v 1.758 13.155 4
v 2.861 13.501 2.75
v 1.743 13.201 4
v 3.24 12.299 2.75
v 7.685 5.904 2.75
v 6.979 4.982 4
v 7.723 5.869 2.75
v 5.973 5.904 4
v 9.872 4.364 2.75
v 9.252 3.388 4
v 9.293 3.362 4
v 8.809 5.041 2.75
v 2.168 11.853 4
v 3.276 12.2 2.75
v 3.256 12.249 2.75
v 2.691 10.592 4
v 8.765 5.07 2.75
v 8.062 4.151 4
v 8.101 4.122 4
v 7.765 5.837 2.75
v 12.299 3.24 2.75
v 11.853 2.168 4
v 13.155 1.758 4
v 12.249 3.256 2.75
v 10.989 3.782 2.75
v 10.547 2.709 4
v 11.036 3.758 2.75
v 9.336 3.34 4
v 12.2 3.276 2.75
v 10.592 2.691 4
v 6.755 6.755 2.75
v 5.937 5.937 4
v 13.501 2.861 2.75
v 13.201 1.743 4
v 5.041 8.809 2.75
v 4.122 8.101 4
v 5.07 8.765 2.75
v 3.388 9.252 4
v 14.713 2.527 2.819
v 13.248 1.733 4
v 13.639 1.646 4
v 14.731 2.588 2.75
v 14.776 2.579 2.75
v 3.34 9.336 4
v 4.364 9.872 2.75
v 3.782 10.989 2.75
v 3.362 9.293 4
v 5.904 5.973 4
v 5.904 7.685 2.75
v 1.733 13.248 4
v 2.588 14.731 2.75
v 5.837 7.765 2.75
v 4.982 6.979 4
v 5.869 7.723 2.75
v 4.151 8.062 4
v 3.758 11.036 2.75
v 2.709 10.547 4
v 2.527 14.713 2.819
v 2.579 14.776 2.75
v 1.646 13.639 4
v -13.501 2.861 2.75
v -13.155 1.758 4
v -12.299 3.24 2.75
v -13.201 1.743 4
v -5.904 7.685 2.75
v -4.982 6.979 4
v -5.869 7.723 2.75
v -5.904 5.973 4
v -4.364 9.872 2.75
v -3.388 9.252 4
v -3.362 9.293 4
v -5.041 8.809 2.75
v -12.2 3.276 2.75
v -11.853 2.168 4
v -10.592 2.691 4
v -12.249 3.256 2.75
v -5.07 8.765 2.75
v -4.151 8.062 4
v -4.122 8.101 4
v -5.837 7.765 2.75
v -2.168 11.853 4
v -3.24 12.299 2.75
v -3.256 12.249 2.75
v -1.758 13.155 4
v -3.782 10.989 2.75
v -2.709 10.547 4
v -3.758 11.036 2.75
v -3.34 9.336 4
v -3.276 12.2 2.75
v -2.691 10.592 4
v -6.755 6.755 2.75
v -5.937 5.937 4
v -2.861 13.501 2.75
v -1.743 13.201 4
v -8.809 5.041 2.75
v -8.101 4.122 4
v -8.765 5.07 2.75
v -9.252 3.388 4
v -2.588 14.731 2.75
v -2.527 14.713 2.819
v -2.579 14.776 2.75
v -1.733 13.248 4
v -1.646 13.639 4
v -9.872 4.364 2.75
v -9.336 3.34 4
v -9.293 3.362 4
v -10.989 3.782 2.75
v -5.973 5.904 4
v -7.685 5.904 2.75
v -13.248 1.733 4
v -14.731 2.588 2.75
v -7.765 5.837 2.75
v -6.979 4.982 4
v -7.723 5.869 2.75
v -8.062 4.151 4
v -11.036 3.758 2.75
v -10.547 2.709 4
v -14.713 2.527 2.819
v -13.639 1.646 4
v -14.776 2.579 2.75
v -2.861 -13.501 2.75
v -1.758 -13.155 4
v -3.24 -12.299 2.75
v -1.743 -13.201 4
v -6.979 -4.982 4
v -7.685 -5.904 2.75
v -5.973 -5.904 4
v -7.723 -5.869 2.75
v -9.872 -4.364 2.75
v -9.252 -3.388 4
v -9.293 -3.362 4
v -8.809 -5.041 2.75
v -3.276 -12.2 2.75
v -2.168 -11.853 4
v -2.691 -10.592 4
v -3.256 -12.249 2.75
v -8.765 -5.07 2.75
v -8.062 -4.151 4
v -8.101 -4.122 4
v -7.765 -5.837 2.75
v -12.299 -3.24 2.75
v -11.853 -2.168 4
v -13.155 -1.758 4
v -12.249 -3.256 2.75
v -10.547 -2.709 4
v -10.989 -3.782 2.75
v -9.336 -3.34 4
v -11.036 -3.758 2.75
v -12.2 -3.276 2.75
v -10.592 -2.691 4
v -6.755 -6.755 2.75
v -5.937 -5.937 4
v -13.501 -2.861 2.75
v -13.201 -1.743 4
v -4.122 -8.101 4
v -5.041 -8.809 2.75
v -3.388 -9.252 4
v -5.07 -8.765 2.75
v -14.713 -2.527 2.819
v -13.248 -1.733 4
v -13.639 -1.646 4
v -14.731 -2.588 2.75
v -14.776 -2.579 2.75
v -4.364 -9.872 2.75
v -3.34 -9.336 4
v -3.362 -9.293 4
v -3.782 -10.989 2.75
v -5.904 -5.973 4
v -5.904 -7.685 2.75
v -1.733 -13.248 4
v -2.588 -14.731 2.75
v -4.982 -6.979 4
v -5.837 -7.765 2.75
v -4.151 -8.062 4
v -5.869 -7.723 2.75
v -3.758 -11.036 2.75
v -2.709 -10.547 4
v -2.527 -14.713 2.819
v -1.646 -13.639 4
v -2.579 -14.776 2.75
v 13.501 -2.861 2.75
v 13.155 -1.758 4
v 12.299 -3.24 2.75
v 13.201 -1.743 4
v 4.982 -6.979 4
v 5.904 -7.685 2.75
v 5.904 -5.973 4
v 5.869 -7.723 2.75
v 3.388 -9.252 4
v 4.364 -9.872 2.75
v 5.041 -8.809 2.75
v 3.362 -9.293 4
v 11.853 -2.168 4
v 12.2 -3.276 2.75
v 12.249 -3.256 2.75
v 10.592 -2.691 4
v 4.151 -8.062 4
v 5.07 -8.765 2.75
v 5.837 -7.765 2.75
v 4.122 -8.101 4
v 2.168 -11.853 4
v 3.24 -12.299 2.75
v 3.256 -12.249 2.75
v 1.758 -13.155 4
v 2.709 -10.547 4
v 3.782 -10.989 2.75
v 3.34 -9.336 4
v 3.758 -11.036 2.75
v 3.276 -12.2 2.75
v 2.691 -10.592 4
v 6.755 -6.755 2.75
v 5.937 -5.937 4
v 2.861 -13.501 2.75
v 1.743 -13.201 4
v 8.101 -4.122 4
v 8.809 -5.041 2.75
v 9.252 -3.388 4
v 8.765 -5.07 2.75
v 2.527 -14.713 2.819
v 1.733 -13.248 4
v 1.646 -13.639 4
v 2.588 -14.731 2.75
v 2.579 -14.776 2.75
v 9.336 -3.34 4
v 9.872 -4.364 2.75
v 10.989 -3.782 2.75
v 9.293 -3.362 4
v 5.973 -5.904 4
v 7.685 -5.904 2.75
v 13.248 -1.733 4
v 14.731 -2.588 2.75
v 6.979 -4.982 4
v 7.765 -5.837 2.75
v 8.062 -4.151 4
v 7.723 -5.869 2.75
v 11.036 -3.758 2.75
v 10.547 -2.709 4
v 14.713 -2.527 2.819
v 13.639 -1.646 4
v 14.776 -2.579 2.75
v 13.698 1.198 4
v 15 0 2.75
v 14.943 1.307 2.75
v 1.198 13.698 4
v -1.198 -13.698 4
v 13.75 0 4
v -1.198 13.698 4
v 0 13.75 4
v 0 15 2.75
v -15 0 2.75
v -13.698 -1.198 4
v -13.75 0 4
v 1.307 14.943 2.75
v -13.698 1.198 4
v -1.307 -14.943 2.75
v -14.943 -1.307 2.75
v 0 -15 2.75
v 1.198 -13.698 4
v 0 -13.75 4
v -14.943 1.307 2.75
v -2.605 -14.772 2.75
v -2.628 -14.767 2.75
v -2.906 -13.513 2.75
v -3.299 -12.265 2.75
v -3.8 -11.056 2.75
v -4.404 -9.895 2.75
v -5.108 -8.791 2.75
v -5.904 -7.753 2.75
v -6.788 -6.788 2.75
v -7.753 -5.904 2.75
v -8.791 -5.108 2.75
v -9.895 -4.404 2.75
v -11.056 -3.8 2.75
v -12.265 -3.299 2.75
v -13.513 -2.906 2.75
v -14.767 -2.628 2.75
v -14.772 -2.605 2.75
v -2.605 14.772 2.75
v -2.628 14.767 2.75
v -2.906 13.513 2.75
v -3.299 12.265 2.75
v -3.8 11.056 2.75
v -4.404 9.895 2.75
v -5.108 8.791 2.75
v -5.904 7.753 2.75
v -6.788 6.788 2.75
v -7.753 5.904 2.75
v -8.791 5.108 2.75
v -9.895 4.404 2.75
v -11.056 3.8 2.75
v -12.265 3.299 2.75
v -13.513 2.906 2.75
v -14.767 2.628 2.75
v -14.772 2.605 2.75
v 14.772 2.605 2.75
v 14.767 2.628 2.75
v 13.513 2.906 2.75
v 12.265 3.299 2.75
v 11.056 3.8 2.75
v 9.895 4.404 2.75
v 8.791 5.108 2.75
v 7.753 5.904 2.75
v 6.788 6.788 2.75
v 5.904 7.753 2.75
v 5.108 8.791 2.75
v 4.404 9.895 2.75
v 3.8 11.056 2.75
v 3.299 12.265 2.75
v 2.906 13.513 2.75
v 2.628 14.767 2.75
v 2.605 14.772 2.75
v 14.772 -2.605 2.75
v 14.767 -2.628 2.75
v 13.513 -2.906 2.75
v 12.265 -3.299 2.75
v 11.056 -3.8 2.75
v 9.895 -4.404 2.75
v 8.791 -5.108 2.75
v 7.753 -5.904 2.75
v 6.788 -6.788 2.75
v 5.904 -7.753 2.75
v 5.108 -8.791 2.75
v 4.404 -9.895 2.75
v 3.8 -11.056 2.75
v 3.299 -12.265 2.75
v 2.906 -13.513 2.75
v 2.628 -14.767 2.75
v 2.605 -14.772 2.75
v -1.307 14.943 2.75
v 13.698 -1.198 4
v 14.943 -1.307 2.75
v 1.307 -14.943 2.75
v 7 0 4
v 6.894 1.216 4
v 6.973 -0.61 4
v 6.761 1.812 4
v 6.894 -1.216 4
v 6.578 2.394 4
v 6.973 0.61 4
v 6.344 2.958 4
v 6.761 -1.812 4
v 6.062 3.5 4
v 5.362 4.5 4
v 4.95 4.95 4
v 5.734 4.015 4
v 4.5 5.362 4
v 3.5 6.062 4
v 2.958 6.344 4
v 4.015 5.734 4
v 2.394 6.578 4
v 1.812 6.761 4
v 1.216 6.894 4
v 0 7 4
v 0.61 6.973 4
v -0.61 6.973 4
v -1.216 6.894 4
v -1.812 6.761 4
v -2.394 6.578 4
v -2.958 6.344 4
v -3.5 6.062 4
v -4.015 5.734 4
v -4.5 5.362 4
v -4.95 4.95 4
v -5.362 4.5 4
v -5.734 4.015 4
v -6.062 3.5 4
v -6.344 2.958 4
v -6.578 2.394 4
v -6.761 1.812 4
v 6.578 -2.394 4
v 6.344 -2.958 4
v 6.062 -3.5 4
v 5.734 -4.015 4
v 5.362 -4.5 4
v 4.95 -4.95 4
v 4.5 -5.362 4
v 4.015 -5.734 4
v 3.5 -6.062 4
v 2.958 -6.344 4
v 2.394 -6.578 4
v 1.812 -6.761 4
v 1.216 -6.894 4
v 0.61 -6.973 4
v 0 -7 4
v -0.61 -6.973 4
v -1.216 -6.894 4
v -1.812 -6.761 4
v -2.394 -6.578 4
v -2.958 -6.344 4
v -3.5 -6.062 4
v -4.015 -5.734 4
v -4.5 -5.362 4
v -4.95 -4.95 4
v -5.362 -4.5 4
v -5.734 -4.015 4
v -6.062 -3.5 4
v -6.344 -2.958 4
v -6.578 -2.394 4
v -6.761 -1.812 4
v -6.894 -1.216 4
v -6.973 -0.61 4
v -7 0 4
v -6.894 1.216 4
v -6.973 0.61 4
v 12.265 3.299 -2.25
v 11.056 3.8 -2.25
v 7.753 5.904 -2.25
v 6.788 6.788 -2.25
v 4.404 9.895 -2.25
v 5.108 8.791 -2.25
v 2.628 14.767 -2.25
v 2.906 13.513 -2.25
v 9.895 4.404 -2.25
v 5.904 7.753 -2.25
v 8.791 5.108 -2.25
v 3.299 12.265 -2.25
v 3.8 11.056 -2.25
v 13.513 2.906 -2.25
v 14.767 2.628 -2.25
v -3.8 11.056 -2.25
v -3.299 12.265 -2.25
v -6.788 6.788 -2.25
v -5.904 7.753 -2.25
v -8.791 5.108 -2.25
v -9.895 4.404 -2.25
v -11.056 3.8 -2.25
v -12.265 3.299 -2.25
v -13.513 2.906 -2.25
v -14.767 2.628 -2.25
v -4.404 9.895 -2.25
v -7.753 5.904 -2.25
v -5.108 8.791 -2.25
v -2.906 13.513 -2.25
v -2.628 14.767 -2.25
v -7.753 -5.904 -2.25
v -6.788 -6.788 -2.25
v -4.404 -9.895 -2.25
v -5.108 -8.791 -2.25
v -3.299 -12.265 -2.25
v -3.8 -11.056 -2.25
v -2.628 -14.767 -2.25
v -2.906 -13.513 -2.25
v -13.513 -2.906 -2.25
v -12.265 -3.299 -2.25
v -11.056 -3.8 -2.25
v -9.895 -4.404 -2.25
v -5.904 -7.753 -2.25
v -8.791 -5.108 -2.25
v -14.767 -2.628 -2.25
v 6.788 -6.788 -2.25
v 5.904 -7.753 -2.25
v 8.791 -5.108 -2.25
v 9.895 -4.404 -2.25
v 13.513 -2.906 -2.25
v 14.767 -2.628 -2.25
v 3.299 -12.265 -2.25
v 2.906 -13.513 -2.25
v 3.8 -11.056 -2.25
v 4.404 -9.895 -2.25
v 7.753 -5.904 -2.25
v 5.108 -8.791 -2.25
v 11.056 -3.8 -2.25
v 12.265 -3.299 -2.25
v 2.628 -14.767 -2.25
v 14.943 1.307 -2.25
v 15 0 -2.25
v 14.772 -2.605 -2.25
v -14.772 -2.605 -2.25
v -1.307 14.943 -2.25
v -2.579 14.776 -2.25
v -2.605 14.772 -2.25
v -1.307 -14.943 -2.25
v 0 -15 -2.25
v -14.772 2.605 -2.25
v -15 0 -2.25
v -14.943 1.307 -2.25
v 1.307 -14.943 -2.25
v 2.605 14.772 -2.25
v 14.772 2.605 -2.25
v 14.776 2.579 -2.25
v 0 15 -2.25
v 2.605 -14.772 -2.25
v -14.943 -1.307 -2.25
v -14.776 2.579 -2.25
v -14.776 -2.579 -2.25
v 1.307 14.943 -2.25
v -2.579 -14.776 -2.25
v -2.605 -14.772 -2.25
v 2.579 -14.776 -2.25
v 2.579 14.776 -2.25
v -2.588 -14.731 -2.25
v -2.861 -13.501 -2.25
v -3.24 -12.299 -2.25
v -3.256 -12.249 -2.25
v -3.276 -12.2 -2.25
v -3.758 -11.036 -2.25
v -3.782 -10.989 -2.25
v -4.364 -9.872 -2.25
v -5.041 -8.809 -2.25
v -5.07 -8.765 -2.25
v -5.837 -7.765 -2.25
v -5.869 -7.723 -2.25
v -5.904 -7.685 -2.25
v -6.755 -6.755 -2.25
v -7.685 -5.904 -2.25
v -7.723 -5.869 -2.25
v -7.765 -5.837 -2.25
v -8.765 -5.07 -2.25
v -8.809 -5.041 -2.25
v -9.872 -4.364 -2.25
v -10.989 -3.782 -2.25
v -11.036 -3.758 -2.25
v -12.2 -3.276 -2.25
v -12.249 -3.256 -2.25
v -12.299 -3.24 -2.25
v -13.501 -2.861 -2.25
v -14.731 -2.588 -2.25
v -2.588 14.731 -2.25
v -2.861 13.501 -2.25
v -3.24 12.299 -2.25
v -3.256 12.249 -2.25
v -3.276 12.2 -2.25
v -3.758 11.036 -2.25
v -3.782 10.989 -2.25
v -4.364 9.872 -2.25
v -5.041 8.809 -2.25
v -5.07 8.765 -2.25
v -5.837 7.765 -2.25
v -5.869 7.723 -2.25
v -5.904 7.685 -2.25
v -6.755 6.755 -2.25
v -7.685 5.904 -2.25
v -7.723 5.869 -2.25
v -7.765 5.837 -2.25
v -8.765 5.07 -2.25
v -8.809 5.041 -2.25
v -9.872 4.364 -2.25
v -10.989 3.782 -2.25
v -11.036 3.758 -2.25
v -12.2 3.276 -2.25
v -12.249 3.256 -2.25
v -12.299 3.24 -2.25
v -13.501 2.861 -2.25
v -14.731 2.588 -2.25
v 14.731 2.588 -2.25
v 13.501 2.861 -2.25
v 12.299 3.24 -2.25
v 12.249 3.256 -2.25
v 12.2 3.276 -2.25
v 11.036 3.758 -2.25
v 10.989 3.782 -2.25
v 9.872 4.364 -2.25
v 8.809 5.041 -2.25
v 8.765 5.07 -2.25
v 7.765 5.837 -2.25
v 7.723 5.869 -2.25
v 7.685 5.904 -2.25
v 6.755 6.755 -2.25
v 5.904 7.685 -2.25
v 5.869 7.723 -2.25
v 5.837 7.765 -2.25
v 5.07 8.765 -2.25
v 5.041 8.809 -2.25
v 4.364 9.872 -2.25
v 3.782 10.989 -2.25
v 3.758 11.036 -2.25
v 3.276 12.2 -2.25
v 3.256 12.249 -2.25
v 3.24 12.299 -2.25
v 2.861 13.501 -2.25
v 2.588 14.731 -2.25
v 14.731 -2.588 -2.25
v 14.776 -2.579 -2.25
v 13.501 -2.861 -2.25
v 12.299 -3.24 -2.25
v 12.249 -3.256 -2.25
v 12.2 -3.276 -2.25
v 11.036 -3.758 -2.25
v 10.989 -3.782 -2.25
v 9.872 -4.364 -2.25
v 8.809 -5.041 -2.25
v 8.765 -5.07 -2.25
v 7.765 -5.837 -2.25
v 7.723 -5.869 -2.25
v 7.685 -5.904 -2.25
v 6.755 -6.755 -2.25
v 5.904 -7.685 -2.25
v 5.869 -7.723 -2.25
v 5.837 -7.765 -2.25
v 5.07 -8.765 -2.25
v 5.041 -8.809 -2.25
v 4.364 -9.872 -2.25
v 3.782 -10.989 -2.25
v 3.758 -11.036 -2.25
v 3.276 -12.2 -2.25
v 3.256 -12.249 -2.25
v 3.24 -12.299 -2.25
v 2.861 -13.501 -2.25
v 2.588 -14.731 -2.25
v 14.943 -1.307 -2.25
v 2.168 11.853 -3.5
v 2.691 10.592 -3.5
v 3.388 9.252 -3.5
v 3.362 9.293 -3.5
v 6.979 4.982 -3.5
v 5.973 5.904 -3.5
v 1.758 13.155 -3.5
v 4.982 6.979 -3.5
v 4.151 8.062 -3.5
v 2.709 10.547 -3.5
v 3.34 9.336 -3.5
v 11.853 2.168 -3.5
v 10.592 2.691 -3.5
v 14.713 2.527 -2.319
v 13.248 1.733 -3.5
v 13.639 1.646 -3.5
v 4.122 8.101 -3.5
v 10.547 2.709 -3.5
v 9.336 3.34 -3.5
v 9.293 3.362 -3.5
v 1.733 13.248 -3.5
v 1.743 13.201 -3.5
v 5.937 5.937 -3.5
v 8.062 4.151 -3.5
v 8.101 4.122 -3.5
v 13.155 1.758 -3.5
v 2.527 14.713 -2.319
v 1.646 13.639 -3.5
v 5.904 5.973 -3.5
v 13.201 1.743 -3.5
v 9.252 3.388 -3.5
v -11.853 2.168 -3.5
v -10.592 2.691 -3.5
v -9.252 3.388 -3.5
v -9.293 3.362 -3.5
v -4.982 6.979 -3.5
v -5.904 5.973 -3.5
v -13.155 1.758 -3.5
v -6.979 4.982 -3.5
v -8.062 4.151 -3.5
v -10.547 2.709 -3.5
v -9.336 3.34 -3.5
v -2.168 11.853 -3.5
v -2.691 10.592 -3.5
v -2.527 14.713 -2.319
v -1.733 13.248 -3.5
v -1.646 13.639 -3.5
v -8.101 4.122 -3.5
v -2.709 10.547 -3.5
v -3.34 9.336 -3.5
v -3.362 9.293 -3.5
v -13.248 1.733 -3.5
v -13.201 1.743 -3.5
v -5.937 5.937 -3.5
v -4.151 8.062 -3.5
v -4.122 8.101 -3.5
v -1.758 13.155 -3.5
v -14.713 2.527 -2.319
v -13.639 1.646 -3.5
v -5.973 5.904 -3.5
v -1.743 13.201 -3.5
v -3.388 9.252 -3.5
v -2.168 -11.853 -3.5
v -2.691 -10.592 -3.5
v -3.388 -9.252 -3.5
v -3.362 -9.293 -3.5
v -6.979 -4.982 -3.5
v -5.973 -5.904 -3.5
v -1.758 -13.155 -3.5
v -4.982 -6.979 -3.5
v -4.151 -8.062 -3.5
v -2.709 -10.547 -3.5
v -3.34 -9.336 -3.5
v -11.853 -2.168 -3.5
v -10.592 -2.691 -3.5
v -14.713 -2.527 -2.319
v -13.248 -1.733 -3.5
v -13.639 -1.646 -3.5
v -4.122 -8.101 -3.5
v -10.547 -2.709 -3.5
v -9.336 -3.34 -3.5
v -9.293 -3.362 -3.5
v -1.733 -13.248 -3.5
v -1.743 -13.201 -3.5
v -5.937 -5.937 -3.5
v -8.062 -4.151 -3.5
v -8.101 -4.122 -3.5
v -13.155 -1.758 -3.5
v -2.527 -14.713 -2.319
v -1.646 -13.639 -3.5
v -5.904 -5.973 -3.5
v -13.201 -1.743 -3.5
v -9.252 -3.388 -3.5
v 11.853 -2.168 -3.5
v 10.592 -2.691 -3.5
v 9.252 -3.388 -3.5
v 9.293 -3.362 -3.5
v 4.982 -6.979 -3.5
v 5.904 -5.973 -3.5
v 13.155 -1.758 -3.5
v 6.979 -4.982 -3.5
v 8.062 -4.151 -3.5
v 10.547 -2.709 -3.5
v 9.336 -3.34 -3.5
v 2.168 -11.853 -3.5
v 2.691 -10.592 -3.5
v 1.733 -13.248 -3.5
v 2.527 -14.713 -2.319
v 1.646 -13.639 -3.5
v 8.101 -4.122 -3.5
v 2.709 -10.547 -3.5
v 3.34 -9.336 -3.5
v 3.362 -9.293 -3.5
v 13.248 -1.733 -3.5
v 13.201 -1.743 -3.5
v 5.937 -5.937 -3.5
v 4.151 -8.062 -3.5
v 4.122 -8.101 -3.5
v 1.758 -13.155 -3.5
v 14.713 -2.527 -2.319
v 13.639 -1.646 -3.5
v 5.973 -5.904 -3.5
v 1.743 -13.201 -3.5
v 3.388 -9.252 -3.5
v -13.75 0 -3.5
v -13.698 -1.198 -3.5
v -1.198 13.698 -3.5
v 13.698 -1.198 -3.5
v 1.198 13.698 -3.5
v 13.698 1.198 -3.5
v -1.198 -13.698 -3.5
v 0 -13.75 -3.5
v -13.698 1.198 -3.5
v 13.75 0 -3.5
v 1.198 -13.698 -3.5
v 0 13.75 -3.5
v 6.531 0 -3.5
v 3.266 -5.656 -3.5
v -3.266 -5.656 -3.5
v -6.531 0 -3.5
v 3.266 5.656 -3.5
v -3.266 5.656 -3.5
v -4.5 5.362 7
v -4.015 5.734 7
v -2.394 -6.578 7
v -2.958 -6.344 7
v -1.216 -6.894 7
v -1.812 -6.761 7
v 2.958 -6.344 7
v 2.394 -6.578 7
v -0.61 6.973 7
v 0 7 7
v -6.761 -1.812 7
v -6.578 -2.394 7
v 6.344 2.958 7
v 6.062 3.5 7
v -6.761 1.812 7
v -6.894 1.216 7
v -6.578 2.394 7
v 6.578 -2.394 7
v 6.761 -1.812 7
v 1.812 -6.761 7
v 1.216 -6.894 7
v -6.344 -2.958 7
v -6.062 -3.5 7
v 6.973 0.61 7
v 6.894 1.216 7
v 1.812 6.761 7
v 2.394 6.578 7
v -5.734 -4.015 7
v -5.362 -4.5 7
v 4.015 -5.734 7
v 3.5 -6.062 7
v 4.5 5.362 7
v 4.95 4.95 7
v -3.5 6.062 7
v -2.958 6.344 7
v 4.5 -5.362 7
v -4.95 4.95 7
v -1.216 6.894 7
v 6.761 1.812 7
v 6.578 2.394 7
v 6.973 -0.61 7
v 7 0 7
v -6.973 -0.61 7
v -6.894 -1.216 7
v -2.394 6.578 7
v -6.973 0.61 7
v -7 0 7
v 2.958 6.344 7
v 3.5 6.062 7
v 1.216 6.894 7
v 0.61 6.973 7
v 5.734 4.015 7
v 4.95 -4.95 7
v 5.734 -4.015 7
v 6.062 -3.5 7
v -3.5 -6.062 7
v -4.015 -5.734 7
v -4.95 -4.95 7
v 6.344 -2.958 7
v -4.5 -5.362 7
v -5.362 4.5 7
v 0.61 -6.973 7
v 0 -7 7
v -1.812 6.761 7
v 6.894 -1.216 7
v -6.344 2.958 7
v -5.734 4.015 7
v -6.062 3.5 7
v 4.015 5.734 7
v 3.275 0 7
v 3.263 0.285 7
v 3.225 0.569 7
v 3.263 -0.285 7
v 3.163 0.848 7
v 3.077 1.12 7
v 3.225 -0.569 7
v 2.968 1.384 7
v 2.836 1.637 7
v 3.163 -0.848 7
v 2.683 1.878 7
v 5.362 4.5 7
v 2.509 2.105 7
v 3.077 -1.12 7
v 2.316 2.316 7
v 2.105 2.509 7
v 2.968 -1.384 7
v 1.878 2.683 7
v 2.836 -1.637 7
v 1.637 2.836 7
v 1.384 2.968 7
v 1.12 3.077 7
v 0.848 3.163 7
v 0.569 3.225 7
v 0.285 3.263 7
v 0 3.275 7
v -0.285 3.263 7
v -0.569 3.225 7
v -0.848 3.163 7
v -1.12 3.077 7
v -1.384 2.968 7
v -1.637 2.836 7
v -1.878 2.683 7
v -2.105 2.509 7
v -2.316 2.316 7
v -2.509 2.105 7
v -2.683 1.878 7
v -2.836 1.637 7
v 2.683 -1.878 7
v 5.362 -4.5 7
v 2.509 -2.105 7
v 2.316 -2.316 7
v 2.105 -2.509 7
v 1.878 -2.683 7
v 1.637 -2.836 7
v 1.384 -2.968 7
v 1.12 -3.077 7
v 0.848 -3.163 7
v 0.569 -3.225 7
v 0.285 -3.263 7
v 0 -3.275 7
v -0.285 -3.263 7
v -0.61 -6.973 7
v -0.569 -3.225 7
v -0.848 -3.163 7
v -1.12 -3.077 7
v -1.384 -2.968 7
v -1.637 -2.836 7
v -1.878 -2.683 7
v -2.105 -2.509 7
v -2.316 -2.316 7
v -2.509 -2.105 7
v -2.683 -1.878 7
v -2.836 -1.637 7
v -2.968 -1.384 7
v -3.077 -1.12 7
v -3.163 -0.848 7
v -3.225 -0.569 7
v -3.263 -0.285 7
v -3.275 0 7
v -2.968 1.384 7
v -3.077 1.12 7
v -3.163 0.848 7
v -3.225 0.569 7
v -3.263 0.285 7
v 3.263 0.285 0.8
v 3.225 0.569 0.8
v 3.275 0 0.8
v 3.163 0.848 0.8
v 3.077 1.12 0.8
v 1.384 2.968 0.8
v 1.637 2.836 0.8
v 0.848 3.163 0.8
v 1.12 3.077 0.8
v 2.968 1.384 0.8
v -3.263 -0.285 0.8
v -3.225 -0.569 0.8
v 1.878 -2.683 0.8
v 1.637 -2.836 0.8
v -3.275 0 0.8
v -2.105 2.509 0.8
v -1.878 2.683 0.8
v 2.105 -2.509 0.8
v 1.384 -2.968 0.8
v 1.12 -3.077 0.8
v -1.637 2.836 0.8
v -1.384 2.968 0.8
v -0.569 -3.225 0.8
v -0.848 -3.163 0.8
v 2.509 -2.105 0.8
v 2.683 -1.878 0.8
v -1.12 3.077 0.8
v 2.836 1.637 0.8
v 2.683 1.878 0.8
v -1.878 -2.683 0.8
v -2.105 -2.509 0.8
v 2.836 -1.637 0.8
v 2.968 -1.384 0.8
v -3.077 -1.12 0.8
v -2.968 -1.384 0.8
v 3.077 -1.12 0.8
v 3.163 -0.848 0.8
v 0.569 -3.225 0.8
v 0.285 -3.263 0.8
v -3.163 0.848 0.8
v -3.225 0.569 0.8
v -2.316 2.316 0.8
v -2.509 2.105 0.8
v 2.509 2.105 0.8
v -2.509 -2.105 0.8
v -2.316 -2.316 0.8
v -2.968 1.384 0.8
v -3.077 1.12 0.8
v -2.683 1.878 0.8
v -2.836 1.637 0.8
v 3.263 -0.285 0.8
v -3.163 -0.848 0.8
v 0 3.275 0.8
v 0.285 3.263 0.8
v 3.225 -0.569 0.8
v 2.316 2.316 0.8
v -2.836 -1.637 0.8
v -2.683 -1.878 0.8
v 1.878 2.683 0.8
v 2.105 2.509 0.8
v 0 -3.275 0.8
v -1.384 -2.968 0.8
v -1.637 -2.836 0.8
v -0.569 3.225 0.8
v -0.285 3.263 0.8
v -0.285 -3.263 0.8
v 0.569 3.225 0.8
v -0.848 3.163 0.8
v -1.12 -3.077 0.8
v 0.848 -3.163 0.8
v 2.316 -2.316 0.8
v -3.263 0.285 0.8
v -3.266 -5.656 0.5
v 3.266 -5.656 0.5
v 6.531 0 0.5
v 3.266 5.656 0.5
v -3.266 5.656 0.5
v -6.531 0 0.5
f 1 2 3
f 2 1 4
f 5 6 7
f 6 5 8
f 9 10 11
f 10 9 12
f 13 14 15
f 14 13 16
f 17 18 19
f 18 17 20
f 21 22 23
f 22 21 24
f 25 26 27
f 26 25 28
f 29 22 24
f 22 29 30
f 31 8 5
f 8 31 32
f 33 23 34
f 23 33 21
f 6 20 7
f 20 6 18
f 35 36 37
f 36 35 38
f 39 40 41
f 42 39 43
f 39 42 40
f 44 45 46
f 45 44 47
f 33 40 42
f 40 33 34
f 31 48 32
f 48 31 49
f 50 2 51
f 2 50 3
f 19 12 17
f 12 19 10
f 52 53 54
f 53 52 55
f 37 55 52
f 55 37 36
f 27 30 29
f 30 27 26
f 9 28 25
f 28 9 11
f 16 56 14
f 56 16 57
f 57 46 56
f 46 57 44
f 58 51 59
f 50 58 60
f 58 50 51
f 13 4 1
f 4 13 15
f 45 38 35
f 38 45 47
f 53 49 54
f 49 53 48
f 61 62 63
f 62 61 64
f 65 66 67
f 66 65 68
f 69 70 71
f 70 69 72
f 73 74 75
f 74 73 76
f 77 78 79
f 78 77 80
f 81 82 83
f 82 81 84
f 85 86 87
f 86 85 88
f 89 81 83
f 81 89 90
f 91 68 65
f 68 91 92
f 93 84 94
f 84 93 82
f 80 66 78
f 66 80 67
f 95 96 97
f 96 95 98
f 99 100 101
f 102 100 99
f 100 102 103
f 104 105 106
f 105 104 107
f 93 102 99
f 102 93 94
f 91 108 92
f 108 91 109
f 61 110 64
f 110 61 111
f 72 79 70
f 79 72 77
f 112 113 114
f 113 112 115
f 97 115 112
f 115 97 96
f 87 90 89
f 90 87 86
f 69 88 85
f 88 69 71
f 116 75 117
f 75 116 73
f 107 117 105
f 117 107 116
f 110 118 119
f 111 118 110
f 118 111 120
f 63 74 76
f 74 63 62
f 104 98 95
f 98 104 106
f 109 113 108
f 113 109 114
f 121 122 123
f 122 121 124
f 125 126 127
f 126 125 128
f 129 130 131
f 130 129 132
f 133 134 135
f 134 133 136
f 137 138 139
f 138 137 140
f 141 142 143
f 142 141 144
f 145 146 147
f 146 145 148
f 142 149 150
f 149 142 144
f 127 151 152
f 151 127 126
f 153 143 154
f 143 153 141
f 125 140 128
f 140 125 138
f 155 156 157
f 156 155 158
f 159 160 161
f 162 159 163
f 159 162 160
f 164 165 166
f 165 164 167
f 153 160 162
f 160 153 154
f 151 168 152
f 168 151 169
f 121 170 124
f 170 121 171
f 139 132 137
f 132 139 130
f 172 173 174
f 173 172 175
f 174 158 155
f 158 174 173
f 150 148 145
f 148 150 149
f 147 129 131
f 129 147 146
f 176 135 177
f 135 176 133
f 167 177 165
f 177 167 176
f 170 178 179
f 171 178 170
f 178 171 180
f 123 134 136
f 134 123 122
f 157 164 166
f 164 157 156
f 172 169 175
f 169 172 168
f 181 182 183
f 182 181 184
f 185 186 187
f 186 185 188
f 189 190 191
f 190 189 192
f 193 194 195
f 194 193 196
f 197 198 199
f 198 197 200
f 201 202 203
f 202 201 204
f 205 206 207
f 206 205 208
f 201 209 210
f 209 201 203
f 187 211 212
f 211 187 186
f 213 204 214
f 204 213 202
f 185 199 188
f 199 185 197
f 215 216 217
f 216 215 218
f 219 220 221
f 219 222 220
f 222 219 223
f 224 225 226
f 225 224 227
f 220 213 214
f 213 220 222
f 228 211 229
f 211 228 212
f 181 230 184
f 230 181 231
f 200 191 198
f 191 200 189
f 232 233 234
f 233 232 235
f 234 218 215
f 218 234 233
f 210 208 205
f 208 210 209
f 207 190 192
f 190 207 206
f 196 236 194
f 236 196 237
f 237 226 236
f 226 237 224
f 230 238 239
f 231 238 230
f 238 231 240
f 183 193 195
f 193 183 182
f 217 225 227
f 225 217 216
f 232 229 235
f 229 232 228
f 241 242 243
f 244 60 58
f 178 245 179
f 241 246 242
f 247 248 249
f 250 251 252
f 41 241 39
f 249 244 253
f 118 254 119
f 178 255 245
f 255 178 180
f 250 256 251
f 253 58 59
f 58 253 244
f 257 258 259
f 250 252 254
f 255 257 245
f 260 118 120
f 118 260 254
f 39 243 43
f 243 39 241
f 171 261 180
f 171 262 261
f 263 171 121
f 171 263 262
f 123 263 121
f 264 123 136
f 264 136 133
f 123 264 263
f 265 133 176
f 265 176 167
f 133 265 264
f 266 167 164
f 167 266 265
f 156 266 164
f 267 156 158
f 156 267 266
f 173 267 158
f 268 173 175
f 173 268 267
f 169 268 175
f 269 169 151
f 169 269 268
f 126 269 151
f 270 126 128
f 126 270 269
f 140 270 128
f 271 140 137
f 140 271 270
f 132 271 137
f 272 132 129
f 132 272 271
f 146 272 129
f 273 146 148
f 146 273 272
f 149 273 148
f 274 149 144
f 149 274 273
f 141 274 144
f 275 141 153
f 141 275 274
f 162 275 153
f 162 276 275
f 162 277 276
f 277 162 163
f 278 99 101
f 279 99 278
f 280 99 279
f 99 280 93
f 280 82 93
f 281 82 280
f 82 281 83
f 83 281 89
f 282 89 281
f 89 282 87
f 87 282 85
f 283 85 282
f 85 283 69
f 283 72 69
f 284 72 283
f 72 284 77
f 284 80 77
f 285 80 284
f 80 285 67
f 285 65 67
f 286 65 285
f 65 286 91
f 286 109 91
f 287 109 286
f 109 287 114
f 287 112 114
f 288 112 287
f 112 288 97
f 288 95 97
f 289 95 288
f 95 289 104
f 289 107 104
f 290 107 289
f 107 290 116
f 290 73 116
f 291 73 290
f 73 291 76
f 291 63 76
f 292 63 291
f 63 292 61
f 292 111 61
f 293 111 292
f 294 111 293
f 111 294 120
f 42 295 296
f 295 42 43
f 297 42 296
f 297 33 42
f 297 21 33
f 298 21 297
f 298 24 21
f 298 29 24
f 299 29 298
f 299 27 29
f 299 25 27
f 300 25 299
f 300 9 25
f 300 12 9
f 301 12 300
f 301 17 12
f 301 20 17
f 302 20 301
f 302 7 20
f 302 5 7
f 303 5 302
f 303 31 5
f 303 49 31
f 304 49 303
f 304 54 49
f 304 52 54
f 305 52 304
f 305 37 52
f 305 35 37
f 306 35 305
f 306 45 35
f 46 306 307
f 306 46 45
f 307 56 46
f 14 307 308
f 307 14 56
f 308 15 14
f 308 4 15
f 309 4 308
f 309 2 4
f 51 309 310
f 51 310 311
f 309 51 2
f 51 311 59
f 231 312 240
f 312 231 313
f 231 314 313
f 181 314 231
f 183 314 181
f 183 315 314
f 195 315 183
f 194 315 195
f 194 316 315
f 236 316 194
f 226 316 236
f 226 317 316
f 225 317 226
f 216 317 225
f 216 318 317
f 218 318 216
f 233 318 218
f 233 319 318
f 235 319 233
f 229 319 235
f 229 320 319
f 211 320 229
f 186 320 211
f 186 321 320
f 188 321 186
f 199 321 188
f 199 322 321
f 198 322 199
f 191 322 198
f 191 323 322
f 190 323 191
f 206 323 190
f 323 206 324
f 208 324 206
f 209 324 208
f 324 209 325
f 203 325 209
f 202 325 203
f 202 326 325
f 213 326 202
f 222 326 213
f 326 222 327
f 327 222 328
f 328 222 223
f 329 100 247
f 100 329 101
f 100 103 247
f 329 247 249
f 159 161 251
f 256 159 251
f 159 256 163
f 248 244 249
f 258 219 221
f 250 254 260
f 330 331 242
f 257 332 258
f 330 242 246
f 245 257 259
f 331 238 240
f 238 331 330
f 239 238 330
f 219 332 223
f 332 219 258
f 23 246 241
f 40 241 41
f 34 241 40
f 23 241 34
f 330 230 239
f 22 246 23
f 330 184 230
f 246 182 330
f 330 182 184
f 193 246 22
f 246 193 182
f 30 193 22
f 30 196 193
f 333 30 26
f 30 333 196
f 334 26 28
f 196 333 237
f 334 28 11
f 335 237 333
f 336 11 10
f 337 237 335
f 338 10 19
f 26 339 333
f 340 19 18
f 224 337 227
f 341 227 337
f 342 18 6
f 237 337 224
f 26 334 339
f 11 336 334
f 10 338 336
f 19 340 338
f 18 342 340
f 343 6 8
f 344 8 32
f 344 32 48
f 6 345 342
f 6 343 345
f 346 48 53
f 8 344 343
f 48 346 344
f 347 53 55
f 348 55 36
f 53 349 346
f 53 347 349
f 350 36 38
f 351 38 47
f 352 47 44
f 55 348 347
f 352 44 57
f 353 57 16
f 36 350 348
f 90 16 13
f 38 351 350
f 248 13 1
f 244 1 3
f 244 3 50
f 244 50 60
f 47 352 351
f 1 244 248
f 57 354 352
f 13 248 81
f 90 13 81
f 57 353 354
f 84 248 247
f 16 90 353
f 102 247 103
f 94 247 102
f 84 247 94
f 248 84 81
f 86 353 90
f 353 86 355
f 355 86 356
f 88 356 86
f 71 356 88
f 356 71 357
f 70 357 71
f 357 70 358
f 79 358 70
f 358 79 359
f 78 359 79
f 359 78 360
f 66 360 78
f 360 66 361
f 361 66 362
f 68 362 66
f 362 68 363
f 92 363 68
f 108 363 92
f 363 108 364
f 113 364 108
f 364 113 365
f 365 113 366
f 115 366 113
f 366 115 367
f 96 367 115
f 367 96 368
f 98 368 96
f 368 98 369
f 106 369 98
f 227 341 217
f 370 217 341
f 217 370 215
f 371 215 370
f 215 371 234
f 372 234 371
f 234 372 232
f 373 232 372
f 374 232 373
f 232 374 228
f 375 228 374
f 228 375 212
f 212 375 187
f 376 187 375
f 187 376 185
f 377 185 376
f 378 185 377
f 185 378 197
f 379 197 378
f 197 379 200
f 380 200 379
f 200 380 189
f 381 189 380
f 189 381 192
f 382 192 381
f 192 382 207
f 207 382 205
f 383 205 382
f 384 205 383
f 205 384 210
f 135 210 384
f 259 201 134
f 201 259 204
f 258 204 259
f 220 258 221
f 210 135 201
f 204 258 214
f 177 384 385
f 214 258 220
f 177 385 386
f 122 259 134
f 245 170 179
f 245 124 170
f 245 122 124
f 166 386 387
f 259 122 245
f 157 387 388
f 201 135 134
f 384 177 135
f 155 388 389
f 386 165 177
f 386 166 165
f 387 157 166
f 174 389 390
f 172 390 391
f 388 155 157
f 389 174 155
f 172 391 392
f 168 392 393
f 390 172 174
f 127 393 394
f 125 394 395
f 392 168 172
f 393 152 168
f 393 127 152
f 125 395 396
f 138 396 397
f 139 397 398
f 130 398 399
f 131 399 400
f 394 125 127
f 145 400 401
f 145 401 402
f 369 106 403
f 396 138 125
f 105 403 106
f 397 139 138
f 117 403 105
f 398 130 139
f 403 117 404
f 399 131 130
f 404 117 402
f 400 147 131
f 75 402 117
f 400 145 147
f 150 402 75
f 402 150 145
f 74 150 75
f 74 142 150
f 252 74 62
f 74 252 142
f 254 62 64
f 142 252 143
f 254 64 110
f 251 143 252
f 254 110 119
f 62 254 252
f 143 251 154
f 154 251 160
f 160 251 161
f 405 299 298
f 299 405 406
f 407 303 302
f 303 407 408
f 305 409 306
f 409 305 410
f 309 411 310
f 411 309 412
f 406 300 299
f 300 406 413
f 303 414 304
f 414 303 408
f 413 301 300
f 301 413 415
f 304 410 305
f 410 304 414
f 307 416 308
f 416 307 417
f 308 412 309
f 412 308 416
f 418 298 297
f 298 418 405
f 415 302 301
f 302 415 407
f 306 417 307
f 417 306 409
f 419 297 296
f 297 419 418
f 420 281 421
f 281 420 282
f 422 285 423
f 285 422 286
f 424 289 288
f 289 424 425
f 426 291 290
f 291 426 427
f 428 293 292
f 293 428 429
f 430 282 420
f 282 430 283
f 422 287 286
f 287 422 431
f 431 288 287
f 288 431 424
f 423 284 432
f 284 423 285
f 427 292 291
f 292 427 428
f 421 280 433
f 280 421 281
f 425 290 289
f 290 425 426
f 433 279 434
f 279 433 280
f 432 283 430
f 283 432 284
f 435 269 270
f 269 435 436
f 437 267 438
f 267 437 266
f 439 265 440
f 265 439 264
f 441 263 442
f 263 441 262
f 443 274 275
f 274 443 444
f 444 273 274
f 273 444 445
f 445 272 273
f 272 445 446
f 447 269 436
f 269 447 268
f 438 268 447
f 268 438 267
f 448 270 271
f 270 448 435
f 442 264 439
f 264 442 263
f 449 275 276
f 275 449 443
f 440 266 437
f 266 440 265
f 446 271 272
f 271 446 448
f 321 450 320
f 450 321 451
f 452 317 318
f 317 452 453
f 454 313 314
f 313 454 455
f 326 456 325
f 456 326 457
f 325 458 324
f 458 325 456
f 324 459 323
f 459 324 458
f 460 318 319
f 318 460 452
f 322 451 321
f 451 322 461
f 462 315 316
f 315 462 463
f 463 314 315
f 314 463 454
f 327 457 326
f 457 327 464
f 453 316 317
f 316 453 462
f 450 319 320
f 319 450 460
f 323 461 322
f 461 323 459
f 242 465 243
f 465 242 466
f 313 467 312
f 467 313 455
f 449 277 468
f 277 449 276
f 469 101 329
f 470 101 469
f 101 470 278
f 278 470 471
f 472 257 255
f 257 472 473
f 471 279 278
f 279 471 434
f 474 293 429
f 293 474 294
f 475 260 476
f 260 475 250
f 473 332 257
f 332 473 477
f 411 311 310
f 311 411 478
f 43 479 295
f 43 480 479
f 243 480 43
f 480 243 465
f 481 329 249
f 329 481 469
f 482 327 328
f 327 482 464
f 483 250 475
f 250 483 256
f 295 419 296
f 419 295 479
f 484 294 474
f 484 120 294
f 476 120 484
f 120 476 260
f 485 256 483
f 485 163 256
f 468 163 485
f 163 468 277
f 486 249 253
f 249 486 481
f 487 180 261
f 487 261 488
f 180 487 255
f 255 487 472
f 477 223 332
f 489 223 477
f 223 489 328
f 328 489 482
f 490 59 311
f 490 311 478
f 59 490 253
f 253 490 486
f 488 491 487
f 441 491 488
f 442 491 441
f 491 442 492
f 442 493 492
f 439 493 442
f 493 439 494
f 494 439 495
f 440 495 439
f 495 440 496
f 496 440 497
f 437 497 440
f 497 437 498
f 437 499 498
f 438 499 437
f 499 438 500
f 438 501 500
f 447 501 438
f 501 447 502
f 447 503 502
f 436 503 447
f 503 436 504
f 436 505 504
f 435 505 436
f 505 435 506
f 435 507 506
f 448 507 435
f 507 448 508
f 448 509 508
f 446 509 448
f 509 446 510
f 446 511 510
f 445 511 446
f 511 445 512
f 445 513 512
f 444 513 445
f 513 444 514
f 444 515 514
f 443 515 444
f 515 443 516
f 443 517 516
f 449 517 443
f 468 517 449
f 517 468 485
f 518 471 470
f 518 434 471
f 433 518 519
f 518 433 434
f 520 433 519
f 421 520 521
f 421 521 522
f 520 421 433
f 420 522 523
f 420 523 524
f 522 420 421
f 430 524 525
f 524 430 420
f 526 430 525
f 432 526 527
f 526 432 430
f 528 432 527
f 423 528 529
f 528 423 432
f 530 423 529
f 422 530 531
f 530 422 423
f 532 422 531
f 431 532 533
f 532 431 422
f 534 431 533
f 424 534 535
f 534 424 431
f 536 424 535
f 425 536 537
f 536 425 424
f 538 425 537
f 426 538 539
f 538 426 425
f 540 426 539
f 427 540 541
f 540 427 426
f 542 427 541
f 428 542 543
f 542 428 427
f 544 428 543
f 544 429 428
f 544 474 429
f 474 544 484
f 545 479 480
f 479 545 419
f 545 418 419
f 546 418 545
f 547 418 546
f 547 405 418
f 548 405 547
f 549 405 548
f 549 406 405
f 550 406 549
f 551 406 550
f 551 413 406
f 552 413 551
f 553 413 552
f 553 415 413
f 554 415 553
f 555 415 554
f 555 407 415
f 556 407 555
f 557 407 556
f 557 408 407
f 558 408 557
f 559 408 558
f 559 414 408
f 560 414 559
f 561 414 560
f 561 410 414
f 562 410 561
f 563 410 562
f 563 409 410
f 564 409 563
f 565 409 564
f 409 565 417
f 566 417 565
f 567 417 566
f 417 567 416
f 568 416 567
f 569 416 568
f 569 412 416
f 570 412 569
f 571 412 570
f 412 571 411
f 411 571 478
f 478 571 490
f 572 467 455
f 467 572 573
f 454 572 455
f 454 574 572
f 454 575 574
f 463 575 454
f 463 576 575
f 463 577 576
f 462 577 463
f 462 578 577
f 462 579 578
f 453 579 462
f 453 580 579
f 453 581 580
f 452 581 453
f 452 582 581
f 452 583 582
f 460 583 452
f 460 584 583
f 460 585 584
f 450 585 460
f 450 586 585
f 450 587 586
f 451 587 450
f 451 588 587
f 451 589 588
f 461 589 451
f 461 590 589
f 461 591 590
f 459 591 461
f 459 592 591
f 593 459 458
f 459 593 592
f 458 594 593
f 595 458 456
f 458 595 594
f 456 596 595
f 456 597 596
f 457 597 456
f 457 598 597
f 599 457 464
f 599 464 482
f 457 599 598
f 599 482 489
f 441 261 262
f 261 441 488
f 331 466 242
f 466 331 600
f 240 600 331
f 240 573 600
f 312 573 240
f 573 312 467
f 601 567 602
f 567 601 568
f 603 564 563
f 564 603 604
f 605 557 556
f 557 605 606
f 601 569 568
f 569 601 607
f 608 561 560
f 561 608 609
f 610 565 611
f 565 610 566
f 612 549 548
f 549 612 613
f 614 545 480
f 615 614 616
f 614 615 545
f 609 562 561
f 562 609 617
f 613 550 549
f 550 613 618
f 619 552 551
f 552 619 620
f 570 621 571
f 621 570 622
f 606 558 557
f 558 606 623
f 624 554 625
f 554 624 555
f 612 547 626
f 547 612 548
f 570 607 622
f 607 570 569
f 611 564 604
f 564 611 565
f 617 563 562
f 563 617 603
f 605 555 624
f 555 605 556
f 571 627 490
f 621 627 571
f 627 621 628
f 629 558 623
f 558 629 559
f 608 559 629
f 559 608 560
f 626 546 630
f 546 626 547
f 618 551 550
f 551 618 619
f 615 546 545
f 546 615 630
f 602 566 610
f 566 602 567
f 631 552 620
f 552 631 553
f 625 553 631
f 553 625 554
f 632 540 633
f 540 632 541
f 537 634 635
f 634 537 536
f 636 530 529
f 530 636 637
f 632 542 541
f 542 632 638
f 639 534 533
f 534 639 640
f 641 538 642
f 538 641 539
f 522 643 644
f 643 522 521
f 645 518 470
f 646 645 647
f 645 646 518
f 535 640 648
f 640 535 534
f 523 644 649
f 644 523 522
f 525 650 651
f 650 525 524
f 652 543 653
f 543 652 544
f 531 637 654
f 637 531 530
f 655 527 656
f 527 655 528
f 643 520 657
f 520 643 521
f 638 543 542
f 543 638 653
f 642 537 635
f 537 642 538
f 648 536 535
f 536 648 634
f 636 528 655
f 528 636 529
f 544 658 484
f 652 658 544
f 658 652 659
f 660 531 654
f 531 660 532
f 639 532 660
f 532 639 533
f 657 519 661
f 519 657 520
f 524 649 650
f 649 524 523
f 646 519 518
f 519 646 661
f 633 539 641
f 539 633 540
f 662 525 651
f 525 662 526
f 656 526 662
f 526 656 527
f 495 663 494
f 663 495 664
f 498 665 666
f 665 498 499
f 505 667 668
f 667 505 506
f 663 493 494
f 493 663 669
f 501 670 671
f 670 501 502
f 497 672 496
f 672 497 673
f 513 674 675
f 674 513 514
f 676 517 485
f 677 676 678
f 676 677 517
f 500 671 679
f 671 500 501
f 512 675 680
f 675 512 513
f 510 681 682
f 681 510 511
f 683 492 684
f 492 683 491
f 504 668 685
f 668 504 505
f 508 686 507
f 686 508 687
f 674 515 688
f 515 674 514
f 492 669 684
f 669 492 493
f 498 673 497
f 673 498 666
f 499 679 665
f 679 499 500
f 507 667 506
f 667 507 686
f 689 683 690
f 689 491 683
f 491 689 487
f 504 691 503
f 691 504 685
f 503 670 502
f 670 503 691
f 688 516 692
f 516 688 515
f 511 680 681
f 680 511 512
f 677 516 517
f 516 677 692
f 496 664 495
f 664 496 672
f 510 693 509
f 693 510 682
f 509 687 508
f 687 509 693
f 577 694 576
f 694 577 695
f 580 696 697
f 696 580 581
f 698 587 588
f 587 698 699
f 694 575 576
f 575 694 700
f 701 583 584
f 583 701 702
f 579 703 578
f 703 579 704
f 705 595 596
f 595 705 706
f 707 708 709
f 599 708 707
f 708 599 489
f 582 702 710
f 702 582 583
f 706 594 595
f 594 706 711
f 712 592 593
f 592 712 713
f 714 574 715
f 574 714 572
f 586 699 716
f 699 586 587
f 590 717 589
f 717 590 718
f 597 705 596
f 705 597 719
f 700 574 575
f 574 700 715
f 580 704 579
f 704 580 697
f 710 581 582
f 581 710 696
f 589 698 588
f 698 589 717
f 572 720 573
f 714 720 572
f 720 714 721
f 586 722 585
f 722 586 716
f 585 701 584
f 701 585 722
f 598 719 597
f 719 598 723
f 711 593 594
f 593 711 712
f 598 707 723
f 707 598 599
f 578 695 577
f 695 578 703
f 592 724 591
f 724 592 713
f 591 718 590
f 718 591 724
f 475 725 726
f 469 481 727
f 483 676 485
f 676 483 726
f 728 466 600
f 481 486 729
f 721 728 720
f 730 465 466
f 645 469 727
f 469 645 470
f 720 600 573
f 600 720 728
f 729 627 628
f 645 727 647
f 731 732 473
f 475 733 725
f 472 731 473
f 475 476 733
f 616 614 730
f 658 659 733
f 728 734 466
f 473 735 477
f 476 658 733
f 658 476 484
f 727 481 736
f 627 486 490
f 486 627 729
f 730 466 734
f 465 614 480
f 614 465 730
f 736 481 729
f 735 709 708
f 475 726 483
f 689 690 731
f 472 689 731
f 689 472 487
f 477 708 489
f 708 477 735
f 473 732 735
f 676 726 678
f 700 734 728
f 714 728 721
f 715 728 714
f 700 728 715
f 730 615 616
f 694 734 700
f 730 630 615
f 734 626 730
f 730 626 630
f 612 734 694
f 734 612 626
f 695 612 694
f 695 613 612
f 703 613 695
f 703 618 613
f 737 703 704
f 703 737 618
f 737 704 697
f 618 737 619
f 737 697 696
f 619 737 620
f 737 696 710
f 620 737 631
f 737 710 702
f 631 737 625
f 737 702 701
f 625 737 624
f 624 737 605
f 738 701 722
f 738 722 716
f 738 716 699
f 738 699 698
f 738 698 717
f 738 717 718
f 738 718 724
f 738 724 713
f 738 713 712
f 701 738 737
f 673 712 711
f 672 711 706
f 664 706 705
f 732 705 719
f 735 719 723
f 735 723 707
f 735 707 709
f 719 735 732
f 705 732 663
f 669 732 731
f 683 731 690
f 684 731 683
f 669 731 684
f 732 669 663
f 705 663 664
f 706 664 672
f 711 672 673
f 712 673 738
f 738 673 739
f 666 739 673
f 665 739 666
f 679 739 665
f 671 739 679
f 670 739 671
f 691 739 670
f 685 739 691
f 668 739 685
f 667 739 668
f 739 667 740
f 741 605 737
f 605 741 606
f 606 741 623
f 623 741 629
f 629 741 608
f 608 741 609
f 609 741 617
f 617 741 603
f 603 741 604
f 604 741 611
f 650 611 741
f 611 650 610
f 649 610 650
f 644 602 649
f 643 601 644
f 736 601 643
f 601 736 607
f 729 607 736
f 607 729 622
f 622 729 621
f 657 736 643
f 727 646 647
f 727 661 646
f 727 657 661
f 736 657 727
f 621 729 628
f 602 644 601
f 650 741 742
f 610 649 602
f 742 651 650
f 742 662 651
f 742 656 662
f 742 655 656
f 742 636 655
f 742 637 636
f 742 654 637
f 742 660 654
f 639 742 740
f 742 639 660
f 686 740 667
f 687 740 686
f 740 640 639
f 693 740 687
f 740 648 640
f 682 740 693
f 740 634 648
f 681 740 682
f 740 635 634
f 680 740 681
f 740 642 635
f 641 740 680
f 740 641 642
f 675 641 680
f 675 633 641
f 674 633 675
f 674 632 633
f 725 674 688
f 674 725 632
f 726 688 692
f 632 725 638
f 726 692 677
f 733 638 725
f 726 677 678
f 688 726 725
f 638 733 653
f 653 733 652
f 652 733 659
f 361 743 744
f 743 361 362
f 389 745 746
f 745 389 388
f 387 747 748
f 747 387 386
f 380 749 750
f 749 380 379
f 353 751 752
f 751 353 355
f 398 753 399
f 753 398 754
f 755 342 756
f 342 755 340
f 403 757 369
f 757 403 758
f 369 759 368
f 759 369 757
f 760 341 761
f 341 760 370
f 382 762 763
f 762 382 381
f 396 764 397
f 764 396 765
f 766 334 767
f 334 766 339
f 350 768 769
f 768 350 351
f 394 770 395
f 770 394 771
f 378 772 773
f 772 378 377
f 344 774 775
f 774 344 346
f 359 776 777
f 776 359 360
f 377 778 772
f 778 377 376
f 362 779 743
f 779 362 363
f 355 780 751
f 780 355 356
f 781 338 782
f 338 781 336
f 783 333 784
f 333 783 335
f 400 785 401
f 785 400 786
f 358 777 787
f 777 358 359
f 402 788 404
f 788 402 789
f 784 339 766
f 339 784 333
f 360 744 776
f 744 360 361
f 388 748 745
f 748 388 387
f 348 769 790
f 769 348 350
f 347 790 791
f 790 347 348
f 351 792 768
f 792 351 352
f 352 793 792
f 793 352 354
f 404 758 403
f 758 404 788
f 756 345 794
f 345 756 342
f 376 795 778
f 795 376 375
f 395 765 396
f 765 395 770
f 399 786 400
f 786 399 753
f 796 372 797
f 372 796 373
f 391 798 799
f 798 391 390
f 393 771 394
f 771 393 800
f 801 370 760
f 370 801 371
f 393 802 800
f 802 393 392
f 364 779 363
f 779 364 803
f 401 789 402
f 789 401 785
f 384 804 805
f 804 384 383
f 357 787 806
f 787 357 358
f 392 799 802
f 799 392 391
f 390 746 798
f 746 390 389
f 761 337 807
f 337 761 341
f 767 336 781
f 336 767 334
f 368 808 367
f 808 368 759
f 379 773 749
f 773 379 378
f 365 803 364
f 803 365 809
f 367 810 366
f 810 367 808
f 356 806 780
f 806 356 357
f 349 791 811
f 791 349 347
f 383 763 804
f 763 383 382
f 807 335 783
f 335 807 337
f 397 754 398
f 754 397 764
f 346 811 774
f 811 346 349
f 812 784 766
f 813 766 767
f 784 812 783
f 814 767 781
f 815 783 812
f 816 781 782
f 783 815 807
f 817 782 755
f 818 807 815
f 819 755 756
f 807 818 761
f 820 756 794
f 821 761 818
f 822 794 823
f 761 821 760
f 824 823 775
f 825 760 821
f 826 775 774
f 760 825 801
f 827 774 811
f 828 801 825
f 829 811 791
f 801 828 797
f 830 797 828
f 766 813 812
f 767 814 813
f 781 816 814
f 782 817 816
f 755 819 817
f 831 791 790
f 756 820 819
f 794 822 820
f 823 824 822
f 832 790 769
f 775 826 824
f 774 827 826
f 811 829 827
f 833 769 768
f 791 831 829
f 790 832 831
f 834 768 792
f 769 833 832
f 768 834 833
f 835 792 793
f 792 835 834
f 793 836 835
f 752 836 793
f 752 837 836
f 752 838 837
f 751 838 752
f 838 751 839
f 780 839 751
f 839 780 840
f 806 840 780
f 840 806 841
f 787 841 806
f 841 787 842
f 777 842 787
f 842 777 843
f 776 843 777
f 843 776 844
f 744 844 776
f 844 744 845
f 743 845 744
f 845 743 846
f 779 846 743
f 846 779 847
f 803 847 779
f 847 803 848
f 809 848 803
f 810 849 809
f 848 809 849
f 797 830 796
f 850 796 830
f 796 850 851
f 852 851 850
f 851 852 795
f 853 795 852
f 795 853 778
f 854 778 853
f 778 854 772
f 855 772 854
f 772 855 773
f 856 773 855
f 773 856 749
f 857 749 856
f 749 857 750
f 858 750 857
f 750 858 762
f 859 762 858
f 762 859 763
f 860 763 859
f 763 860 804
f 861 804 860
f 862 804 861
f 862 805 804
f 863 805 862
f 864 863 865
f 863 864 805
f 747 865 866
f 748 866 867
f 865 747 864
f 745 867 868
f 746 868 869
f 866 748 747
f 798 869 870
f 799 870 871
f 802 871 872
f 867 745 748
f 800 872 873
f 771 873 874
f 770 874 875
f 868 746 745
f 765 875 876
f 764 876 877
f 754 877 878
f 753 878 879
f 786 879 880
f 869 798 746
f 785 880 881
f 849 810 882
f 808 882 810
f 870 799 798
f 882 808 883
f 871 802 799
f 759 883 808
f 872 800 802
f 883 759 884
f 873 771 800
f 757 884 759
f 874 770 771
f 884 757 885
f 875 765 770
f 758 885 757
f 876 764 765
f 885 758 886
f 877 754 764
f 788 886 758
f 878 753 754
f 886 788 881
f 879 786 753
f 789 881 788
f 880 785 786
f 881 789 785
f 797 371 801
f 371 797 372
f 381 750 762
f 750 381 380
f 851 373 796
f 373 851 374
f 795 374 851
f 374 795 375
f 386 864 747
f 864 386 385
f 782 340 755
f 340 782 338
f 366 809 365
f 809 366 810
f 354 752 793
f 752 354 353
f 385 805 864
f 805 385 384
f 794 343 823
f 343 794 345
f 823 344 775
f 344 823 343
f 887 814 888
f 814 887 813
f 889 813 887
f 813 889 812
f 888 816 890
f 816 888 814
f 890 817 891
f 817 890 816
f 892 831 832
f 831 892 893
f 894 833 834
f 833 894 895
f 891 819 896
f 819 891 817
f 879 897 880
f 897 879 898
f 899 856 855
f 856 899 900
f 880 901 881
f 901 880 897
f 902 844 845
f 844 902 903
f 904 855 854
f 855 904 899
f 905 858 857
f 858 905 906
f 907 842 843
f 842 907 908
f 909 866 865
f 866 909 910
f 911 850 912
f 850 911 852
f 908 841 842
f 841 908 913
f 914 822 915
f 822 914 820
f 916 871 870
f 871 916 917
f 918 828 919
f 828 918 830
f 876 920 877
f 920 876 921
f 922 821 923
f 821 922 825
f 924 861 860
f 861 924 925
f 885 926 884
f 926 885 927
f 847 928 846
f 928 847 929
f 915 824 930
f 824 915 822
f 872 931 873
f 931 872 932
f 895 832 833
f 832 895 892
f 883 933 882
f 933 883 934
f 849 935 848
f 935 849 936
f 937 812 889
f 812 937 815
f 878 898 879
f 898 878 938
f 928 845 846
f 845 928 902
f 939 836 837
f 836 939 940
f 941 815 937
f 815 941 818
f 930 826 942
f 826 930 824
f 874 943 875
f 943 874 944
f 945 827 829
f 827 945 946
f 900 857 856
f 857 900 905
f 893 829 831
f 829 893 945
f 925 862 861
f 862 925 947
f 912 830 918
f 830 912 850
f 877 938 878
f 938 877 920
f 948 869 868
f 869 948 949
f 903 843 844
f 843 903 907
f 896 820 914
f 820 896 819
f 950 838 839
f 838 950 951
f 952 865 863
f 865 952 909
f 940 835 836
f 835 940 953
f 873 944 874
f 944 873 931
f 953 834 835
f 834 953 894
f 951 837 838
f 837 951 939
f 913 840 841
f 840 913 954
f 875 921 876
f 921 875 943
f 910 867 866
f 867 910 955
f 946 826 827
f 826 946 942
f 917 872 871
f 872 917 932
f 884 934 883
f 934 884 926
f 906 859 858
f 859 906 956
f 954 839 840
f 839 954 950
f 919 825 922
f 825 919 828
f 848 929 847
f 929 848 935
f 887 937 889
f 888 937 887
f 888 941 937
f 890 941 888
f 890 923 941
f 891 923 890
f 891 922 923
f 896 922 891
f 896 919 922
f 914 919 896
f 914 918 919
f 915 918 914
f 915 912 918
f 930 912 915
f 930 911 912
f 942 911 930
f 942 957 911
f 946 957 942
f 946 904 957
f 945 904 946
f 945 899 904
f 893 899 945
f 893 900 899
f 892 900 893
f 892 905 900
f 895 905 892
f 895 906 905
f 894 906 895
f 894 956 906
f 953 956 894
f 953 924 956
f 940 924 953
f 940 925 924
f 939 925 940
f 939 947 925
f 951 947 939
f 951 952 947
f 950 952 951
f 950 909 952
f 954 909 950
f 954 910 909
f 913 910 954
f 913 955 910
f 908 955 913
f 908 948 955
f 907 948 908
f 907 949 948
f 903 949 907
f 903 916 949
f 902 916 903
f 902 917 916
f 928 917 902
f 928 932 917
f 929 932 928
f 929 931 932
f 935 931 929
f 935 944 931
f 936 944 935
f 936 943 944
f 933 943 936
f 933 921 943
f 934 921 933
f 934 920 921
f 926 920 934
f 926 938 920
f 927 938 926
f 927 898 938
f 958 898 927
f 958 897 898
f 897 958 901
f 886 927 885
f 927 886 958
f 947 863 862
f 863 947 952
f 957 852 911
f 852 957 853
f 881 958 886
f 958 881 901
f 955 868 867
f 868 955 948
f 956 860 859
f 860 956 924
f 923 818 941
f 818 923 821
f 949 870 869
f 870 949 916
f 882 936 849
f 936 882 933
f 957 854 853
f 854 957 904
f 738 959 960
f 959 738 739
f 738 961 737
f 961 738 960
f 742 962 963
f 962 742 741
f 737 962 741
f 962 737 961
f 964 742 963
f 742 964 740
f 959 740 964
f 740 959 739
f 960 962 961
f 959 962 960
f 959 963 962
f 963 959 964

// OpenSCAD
// [FL_INDEX: keywords="openscad, 3d_parametric, Customizable_Finger_Grip_for_Hex_Head_Screw, csg_solid" | COT="Parametric OpenSCAD design from 3DCodeverse"]
// Title: Customizable Finger Grip for Hex Head Screw

/*
FingerGrip for HexHeadScrew (c) by Lukas Süss (2013)

FingerGrip for HexHeadScrew is licensed under a
Creative Commons Attribution 3.0 Unported License.

You should have received a copy of the license along with this
work.  If not, see <http://creativecommons.org/licenses/by/3.0/>.
*/



// outer diameter of screw thread (default: Fotoscrew 1/4''+ 0.2mm clearing)
dscrew = 6.55;
// wrench width (default: Fotoscrew 7/16''+ 0.2mm clearing)
sscrewhead = 11.3125;
// hight of head (default: Fotoscrew 4mm) only used for thinn designs
hscrewhead = 4;

// hight of grip without protrusion
hgrip = 7.5;
// outermost diameter of grip
dgrip = 30;
// how much sould the edge be broken
bevel = 1.25;
// hight of protrusion
hprotrus = 3;
// how far to shift the fingerdents outward (in %)
shift = 82; //  [80.0:100.0]


eps=0.05*1;
$fa=5*1;
$fs=0.2*1;

screwhead(hgrip,dgrip,bevel);


module screwhead(hknob,dknob,t) // f=0.85
{
  translate([0,0,hscrewhead]) scale([1,1,-1])
  difference()
  {
    rotate(45*1,[0,0,1]) //screw retainment? glue?  <<<< ??
    union()
    { 
      translate([0,0,0]) screwheadbasebody(t,dknob,t,0);
      translate([0,0,t]) screwheadbasebody(hknob-2*t,dknob,0,0);
      translate([0,0,hknob-t]) screwheadbasebody(t,dknob,0,t);
      scale([1,1,-1]) cylinder(r=14/2,h=hprotrus);
    } 
    headcutter(hknob);
  }
}
module screwheadbasebody(hknob,dknob,t1,t2)
{
  difference()
  {
    union()
    {
      cylinder(h=hknob,r1=dknob/2-t1,r2=dknob/2-t2);
    }
    for(i=[0:3])
    {
      rotate(90*i+15*0,[0,0,1]) translate([dknob*shift/100,0,-eps])
        cylinder(h=hknob+2*eps,r1=dknob/2+t1,r2=dknob/2+t2);
    }
  }
}
module headcutter(hknob)
{
   translate([0,0,-hprotrus-0.3]) cylinder(h=hknob-hscrewhead+hprotrus,r=dscrew/2);
   translate([0,0,min(2*hscrewhead,hknob-hscrewhead)])
     cylinder(h=hknob*1.2,r=sscrewhead/2/cos(30),$fn=6);
}
